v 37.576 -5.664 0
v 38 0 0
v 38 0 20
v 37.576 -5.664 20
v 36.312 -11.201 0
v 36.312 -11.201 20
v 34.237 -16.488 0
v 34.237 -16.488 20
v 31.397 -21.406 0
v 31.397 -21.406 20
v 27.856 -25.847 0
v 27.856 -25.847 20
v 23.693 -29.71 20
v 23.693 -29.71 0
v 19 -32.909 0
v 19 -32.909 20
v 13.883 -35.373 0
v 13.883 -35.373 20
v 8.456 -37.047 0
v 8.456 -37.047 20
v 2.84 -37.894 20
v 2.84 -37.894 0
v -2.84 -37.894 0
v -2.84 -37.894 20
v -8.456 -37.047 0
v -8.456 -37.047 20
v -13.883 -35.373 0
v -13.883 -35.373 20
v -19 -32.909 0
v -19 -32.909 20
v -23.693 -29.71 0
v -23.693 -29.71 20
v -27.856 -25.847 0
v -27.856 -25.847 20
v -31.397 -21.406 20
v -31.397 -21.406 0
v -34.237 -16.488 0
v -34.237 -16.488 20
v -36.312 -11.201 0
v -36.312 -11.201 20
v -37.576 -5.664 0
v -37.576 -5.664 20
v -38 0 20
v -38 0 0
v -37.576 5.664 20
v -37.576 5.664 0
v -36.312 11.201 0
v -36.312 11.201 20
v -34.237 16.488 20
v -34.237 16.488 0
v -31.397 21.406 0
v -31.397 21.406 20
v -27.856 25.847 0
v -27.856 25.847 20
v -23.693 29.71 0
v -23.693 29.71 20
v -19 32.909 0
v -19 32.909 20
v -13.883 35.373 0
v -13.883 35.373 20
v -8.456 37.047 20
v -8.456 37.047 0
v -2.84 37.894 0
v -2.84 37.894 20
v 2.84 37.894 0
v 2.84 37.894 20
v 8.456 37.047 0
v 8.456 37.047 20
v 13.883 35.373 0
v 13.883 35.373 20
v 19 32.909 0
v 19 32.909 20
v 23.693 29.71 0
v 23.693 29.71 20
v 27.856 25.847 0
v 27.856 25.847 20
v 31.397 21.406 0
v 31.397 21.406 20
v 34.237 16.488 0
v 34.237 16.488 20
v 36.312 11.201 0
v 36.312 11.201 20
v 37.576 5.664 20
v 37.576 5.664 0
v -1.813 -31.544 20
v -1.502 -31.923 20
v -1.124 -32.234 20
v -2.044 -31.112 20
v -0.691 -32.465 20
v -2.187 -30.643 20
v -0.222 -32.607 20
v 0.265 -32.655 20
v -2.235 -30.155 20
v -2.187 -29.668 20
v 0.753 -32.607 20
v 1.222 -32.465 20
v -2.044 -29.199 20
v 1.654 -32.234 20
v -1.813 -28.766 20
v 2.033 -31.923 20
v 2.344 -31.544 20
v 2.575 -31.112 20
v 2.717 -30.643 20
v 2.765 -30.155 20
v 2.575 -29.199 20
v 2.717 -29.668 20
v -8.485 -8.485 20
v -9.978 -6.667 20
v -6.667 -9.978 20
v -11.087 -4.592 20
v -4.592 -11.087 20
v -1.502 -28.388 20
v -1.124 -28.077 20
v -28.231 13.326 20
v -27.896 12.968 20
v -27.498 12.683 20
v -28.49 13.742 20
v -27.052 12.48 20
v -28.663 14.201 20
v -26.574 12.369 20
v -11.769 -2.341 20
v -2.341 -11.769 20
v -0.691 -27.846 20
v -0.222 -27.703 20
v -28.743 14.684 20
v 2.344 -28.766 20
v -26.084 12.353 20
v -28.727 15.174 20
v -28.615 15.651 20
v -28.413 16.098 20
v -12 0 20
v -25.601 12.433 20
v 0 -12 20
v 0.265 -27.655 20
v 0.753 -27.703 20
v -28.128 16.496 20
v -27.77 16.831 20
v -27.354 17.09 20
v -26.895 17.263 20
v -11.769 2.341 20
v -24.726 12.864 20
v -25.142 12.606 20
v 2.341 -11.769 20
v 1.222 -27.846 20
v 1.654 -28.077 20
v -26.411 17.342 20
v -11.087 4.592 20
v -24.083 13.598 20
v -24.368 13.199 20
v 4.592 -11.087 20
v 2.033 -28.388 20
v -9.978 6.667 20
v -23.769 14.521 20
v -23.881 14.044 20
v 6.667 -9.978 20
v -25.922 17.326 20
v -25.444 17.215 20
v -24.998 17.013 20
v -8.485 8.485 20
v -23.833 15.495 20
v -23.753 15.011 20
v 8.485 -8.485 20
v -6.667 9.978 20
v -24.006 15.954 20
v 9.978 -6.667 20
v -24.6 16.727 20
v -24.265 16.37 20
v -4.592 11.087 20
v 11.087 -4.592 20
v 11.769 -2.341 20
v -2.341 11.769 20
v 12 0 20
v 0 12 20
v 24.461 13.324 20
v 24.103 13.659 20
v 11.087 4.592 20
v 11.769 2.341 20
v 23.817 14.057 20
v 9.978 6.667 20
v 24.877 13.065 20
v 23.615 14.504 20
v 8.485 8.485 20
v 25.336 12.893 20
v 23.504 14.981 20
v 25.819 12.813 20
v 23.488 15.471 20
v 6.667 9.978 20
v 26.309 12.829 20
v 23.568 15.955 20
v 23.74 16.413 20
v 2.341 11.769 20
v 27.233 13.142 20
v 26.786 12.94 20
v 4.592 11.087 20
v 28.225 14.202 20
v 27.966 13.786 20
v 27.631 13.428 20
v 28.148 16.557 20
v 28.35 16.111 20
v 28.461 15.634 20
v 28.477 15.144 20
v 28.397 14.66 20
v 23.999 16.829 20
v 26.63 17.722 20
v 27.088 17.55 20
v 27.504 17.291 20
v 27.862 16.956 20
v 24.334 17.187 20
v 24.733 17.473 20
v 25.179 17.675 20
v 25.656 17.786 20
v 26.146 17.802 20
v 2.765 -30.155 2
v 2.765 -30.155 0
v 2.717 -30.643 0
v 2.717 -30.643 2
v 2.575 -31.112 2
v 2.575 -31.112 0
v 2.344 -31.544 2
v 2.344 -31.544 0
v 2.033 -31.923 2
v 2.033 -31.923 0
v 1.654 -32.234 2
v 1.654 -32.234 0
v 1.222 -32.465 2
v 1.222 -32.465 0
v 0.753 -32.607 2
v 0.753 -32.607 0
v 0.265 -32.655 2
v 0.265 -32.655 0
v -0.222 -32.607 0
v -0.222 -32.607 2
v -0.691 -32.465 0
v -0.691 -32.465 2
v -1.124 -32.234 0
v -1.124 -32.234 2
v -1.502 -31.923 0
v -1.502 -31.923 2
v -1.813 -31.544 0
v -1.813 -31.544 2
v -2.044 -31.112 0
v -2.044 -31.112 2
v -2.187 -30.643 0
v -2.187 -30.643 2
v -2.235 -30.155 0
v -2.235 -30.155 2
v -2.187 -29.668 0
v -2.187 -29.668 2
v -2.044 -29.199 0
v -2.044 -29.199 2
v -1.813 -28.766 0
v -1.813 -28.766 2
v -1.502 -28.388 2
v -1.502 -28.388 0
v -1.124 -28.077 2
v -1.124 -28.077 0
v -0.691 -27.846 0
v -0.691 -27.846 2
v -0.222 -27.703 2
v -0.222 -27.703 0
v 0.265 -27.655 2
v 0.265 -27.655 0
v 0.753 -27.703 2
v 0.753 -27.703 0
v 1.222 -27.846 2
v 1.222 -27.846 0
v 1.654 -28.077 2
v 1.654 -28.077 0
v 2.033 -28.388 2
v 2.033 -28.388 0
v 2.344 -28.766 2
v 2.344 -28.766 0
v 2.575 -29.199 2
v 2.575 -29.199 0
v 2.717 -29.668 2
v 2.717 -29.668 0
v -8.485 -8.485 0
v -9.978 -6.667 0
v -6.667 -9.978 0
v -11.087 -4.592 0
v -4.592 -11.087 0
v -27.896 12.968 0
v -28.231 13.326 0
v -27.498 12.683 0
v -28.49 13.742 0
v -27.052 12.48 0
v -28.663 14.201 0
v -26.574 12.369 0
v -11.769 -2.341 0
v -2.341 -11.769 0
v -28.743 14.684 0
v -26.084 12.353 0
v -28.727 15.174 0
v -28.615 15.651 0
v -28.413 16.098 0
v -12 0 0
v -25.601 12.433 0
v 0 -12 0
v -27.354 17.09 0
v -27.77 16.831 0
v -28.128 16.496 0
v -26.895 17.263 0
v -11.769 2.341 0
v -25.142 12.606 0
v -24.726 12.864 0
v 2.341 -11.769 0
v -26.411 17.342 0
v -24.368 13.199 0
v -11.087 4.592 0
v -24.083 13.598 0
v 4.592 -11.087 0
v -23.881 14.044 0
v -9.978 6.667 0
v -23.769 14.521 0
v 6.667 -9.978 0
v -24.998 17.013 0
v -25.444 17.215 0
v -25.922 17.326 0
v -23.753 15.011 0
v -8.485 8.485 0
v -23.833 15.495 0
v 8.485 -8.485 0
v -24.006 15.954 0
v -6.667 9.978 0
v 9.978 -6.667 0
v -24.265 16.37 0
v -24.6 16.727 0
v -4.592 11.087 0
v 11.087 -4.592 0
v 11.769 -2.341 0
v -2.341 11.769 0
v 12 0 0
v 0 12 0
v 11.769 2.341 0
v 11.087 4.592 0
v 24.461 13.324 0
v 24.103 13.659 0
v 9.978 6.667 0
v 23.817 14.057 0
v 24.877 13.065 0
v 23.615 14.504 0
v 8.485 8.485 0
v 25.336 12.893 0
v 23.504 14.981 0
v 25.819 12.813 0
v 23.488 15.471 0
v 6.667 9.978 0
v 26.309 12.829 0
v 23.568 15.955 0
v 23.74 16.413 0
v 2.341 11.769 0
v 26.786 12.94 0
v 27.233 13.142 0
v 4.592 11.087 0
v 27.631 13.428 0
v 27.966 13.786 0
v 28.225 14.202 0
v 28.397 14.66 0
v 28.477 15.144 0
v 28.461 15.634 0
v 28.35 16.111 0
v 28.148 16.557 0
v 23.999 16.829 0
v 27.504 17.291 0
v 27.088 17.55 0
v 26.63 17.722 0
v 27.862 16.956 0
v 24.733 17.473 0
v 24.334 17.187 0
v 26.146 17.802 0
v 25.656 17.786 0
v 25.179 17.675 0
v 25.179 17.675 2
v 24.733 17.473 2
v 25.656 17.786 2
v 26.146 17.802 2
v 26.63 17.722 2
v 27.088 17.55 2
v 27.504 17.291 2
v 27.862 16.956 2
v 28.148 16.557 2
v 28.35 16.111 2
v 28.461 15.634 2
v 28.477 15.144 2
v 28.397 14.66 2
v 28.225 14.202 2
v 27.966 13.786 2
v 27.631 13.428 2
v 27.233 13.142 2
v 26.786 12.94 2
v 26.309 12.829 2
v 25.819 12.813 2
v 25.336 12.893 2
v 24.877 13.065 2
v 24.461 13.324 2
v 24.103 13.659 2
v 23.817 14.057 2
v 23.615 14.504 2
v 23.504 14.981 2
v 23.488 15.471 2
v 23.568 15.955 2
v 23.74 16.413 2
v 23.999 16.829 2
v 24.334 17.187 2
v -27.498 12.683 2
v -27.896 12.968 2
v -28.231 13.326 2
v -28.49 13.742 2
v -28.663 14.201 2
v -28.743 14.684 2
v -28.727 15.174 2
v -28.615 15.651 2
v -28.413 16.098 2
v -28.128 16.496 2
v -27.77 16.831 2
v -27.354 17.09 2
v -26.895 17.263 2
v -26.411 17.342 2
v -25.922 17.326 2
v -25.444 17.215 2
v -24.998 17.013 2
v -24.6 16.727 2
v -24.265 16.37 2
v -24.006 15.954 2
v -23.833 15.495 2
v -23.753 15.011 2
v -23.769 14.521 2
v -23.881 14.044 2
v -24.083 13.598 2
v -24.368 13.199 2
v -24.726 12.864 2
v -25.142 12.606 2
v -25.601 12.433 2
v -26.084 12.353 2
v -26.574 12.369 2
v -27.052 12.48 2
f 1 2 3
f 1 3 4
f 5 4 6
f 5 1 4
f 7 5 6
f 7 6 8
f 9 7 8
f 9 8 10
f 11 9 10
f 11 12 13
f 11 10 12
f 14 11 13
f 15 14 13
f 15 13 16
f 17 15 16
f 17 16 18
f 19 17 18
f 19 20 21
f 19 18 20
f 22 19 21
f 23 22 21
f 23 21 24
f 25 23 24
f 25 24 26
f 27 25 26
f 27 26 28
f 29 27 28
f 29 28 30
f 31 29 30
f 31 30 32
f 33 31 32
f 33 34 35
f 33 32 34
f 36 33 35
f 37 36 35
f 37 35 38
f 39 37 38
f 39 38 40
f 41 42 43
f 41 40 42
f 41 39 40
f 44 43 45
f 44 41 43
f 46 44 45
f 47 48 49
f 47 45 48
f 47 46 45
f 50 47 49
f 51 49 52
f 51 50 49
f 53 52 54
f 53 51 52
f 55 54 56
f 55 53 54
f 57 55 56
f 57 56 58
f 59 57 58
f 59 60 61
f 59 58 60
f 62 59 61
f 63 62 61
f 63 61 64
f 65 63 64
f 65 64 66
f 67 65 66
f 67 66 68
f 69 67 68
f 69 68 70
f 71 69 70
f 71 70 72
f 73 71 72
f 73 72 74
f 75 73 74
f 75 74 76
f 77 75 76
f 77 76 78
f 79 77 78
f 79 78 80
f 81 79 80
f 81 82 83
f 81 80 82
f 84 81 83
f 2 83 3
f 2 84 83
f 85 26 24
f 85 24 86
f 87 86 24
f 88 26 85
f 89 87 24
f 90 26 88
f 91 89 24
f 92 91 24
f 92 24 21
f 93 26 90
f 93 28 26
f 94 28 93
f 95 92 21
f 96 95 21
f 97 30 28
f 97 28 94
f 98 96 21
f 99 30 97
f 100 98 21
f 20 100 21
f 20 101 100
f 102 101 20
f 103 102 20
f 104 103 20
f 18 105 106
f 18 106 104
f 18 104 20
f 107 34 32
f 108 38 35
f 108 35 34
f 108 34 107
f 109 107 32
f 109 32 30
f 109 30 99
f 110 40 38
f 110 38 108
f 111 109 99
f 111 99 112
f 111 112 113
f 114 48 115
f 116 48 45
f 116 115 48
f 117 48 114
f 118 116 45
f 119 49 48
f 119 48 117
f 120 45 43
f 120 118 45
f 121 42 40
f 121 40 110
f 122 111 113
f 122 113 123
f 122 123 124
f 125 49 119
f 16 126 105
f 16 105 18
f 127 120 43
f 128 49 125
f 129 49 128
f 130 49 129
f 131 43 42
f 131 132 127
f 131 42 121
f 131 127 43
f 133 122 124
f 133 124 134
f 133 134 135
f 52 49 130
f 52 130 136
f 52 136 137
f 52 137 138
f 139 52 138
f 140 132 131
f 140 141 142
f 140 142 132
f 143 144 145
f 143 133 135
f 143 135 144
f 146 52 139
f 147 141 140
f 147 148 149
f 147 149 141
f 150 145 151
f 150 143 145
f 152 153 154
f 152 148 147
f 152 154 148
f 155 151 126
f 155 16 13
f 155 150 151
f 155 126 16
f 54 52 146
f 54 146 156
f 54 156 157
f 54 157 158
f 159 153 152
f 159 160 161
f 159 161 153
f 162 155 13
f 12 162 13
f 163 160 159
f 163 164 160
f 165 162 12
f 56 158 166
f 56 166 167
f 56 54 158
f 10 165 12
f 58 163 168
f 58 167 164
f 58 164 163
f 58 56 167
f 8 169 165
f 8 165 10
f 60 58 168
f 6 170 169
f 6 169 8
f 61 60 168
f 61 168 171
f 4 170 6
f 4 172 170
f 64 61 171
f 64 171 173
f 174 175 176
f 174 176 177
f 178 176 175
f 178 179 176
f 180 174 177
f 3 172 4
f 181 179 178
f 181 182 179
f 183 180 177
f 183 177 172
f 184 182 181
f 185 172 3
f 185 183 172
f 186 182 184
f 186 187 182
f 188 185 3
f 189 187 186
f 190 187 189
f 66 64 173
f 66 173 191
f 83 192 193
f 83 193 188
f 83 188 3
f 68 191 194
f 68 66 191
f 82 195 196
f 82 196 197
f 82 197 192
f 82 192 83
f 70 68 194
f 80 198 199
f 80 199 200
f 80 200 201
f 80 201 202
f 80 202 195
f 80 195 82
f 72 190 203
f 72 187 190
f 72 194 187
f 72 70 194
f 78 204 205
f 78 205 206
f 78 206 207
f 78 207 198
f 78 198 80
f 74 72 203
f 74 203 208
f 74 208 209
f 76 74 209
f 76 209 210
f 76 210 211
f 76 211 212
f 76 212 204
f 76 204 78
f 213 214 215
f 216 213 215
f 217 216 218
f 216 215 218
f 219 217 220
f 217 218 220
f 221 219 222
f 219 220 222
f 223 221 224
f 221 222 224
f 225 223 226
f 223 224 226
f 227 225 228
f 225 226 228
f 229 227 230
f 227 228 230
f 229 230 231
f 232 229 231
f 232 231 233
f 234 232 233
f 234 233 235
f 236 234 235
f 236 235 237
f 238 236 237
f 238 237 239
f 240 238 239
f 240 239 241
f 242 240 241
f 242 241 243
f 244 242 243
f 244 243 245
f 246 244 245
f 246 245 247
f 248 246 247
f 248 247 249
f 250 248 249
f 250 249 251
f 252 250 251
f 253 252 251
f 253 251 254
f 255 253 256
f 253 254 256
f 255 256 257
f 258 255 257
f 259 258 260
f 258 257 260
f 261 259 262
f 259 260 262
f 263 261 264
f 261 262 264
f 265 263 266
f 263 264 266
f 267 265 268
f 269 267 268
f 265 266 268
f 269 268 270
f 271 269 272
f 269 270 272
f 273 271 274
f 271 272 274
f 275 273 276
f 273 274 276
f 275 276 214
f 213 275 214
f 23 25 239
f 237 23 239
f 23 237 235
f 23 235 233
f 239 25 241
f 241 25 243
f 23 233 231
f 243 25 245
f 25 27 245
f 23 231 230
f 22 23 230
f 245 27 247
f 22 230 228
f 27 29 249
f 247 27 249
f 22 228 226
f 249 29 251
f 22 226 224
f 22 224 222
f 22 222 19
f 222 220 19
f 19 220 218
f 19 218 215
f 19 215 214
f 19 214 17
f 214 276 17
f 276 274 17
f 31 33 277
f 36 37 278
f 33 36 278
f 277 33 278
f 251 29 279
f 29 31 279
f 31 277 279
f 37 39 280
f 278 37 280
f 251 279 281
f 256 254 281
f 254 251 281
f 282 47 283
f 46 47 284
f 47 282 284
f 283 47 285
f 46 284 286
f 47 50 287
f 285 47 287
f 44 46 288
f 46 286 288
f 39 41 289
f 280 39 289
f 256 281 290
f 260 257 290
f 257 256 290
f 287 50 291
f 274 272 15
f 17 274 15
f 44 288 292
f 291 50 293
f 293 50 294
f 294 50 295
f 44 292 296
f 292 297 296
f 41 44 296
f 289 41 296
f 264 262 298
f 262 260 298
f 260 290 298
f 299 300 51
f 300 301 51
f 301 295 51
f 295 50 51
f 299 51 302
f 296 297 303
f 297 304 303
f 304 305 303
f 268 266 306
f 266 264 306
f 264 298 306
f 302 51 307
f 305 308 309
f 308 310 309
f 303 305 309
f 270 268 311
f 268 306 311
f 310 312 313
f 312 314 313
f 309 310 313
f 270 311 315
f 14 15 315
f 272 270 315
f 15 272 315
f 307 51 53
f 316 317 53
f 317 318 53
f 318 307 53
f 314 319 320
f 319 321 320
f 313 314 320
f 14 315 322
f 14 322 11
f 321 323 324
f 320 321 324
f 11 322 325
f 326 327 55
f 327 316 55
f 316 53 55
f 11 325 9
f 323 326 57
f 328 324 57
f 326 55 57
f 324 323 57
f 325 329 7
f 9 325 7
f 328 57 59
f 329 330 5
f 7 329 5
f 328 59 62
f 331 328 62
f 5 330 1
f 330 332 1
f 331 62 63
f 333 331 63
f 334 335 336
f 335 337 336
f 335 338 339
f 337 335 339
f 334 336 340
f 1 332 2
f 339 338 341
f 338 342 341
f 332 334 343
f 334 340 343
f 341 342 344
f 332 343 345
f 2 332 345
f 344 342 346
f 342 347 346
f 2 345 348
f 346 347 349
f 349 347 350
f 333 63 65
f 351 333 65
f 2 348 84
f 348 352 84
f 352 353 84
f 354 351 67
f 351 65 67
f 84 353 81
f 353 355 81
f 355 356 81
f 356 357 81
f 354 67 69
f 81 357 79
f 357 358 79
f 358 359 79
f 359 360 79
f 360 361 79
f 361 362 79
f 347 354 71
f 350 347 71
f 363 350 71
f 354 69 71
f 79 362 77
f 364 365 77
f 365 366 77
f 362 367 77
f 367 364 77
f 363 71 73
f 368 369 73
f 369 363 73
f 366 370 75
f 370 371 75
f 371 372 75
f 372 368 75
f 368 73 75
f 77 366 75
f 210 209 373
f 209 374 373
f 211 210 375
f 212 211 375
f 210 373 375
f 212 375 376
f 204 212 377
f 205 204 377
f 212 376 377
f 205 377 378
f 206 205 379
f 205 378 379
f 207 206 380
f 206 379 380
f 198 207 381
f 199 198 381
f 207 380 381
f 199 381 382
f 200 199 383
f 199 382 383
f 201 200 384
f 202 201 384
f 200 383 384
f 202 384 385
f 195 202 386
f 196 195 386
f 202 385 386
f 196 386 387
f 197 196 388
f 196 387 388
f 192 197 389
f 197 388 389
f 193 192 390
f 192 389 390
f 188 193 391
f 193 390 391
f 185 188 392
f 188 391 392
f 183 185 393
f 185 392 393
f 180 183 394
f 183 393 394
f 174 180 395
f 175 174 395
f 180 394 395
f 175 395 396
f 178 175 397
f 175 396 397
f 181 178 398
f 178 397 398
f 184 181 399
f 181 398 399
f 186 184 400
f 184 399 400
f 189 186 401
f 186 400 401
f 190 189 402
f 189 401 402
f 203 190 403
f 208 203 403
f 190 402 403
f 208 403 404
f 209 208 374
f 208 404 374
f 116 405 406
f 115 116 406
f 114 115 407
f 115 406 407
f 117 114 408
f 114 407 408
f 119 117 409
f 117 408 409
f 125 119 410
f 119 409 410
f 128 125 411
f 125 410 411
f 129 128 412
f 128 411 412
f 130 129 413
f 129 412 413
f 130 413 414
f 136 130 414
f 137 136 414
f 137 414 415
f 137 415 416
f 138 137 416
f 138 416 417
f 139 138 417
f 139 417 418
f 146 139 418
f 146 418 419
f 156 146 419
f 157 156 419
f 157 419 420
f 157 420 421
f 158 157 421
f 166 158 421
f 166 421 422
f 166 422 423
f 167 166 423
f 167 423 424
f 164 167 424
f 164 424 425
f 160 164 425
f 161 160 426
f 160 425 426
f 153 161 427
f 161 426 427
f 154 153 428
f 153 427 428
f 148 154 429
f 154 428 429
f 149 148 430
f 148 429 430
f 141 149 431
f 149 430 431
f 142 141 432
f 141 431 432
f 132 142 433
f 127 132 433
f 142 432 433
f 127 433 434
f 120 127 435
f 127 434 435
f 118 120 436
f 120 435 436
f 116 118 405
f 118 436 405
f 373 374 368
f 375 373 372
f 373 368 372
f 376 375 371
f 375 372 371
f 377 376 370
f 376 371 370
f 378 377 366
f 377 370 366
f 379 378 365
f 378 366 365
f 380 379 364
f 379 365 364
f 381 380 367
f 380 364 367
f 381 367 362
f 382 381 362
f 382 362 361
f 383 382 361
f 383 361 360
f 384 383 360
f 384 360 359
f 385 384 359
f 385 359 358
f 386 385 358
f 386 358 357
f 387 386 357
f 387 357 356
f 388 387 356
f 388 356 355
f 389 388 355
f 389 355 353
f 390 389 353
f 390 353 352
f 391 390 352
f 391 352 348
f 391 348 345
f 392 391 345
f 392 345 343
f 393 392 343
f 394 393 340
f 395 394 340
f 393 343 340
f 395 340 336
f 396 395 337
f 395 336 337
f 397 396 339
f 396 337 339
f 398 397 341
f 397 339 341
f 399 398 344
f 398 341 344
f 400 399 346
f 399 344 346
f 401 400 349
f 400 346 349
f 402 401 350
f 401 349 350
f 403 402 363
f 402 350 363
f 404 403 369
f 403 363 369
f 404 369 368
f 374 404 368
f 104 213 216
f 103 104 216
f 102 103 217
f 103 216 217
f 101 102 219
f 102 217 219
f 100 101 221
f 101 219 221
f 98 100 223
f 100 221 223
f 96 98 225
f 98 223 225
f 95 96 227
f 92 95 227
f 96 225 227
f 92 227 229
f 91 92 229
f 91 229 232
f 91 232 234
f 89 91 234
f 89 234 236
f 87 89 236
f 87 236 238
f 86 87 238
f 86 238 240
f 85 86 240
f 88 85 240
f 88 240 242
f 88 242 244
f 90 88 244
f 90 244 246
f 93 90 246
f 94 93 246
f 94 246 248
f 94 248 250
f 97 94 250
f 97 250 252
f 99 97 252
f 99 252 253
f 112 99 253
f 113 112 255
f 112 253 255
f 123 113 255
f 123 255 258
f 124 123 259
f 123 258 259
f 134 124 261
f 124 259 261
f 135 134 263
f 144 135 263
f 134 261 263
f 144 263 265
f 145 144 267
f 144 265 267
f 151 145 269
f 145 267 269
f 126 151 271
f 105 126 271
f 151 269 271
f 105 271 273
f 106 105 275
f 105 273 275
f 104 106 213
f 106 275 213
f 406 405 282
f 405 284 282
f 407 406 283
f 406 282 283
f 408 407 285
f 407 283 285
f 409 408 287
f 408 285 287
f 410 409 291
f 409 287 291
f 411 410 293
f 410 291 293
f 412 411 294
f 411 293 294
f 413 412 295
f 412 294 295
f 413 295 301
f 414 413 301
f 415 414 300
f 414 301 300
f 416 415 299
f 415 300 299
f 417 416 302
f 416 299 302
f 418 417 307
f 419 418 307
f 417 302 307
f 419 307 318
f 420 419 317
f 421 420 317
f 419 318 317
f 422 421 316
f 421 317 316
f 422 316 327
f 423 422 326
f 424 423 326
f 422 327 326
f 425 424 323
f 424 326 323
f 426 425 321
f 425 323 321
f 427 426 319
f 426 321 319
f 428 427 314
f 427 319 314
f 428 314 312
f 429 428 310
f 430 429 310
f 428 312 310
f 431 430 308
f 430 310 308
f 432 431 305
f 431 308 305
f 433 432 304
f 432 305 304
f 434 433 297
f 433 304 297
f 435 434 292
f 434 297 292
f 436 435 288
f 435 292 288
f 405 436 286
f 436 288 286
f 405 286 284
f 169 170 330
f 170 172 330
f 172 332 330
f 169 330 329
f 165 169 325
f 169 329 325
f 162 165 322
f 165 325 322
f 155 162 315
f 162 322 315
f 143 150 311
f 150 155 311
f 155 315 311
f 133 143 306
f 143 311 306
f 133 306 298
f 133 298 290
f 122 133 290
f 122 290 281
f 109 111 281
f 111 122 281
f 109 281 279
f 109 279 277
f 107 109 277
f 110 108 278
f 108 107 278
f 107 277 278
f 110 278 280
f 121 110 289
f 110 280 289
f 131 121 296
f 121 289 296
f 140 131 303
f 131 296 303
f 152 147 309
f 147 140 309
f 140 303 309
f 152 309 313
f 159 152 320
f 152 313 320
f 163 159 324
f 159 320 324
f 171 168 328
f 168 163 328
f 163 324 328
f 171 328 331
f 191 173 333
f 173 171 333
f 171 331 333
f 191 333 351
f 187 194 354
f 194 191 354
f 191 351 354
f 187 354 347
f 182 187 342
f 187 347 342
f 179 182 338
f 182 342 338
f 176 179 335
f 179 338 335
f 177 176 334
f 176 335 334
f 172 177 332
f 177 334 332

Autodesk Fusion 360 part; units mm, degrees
sketch "Sketch1" plane through (0, 0, 0) normal (0, 0, 1) x (1, 0, 0)
  circle A0 centre (0, 0) radius 12
  circle A1 centre (0, 0) radius 22.5
  circle A2 centre (0, 0) radius 38
  dimension "d1" = 45
  dimension "d2" = 24
  dimension "d3" = 76
extrude "Extrude1" add sketch "Sketch1" along normal blind 20 contours A1
sketch "Sketch2" plane through (0, 0, 0) normal (0, 0, 1) x (1, 0, 0)
  circle A0 centre (0.2654, -30.1553) radius 2.5
  dimension "d8" = 5
extrude "Extrude4" add sketch "Sketch1" along normal blind 2 contours A1 | A2
extrude "Extrude5" cut sketch "Sketch2" along normal blind 6.312
pattern_circular "C-Pattern2" count 3 over 360 about axis through (0, 0, 2) along (0, 0, 1) of "Extrude5"
extrude "돌출6" add 1 faces at (-20.8034, 21.3677, 2) along direction (0, 0, 1) blind 18
